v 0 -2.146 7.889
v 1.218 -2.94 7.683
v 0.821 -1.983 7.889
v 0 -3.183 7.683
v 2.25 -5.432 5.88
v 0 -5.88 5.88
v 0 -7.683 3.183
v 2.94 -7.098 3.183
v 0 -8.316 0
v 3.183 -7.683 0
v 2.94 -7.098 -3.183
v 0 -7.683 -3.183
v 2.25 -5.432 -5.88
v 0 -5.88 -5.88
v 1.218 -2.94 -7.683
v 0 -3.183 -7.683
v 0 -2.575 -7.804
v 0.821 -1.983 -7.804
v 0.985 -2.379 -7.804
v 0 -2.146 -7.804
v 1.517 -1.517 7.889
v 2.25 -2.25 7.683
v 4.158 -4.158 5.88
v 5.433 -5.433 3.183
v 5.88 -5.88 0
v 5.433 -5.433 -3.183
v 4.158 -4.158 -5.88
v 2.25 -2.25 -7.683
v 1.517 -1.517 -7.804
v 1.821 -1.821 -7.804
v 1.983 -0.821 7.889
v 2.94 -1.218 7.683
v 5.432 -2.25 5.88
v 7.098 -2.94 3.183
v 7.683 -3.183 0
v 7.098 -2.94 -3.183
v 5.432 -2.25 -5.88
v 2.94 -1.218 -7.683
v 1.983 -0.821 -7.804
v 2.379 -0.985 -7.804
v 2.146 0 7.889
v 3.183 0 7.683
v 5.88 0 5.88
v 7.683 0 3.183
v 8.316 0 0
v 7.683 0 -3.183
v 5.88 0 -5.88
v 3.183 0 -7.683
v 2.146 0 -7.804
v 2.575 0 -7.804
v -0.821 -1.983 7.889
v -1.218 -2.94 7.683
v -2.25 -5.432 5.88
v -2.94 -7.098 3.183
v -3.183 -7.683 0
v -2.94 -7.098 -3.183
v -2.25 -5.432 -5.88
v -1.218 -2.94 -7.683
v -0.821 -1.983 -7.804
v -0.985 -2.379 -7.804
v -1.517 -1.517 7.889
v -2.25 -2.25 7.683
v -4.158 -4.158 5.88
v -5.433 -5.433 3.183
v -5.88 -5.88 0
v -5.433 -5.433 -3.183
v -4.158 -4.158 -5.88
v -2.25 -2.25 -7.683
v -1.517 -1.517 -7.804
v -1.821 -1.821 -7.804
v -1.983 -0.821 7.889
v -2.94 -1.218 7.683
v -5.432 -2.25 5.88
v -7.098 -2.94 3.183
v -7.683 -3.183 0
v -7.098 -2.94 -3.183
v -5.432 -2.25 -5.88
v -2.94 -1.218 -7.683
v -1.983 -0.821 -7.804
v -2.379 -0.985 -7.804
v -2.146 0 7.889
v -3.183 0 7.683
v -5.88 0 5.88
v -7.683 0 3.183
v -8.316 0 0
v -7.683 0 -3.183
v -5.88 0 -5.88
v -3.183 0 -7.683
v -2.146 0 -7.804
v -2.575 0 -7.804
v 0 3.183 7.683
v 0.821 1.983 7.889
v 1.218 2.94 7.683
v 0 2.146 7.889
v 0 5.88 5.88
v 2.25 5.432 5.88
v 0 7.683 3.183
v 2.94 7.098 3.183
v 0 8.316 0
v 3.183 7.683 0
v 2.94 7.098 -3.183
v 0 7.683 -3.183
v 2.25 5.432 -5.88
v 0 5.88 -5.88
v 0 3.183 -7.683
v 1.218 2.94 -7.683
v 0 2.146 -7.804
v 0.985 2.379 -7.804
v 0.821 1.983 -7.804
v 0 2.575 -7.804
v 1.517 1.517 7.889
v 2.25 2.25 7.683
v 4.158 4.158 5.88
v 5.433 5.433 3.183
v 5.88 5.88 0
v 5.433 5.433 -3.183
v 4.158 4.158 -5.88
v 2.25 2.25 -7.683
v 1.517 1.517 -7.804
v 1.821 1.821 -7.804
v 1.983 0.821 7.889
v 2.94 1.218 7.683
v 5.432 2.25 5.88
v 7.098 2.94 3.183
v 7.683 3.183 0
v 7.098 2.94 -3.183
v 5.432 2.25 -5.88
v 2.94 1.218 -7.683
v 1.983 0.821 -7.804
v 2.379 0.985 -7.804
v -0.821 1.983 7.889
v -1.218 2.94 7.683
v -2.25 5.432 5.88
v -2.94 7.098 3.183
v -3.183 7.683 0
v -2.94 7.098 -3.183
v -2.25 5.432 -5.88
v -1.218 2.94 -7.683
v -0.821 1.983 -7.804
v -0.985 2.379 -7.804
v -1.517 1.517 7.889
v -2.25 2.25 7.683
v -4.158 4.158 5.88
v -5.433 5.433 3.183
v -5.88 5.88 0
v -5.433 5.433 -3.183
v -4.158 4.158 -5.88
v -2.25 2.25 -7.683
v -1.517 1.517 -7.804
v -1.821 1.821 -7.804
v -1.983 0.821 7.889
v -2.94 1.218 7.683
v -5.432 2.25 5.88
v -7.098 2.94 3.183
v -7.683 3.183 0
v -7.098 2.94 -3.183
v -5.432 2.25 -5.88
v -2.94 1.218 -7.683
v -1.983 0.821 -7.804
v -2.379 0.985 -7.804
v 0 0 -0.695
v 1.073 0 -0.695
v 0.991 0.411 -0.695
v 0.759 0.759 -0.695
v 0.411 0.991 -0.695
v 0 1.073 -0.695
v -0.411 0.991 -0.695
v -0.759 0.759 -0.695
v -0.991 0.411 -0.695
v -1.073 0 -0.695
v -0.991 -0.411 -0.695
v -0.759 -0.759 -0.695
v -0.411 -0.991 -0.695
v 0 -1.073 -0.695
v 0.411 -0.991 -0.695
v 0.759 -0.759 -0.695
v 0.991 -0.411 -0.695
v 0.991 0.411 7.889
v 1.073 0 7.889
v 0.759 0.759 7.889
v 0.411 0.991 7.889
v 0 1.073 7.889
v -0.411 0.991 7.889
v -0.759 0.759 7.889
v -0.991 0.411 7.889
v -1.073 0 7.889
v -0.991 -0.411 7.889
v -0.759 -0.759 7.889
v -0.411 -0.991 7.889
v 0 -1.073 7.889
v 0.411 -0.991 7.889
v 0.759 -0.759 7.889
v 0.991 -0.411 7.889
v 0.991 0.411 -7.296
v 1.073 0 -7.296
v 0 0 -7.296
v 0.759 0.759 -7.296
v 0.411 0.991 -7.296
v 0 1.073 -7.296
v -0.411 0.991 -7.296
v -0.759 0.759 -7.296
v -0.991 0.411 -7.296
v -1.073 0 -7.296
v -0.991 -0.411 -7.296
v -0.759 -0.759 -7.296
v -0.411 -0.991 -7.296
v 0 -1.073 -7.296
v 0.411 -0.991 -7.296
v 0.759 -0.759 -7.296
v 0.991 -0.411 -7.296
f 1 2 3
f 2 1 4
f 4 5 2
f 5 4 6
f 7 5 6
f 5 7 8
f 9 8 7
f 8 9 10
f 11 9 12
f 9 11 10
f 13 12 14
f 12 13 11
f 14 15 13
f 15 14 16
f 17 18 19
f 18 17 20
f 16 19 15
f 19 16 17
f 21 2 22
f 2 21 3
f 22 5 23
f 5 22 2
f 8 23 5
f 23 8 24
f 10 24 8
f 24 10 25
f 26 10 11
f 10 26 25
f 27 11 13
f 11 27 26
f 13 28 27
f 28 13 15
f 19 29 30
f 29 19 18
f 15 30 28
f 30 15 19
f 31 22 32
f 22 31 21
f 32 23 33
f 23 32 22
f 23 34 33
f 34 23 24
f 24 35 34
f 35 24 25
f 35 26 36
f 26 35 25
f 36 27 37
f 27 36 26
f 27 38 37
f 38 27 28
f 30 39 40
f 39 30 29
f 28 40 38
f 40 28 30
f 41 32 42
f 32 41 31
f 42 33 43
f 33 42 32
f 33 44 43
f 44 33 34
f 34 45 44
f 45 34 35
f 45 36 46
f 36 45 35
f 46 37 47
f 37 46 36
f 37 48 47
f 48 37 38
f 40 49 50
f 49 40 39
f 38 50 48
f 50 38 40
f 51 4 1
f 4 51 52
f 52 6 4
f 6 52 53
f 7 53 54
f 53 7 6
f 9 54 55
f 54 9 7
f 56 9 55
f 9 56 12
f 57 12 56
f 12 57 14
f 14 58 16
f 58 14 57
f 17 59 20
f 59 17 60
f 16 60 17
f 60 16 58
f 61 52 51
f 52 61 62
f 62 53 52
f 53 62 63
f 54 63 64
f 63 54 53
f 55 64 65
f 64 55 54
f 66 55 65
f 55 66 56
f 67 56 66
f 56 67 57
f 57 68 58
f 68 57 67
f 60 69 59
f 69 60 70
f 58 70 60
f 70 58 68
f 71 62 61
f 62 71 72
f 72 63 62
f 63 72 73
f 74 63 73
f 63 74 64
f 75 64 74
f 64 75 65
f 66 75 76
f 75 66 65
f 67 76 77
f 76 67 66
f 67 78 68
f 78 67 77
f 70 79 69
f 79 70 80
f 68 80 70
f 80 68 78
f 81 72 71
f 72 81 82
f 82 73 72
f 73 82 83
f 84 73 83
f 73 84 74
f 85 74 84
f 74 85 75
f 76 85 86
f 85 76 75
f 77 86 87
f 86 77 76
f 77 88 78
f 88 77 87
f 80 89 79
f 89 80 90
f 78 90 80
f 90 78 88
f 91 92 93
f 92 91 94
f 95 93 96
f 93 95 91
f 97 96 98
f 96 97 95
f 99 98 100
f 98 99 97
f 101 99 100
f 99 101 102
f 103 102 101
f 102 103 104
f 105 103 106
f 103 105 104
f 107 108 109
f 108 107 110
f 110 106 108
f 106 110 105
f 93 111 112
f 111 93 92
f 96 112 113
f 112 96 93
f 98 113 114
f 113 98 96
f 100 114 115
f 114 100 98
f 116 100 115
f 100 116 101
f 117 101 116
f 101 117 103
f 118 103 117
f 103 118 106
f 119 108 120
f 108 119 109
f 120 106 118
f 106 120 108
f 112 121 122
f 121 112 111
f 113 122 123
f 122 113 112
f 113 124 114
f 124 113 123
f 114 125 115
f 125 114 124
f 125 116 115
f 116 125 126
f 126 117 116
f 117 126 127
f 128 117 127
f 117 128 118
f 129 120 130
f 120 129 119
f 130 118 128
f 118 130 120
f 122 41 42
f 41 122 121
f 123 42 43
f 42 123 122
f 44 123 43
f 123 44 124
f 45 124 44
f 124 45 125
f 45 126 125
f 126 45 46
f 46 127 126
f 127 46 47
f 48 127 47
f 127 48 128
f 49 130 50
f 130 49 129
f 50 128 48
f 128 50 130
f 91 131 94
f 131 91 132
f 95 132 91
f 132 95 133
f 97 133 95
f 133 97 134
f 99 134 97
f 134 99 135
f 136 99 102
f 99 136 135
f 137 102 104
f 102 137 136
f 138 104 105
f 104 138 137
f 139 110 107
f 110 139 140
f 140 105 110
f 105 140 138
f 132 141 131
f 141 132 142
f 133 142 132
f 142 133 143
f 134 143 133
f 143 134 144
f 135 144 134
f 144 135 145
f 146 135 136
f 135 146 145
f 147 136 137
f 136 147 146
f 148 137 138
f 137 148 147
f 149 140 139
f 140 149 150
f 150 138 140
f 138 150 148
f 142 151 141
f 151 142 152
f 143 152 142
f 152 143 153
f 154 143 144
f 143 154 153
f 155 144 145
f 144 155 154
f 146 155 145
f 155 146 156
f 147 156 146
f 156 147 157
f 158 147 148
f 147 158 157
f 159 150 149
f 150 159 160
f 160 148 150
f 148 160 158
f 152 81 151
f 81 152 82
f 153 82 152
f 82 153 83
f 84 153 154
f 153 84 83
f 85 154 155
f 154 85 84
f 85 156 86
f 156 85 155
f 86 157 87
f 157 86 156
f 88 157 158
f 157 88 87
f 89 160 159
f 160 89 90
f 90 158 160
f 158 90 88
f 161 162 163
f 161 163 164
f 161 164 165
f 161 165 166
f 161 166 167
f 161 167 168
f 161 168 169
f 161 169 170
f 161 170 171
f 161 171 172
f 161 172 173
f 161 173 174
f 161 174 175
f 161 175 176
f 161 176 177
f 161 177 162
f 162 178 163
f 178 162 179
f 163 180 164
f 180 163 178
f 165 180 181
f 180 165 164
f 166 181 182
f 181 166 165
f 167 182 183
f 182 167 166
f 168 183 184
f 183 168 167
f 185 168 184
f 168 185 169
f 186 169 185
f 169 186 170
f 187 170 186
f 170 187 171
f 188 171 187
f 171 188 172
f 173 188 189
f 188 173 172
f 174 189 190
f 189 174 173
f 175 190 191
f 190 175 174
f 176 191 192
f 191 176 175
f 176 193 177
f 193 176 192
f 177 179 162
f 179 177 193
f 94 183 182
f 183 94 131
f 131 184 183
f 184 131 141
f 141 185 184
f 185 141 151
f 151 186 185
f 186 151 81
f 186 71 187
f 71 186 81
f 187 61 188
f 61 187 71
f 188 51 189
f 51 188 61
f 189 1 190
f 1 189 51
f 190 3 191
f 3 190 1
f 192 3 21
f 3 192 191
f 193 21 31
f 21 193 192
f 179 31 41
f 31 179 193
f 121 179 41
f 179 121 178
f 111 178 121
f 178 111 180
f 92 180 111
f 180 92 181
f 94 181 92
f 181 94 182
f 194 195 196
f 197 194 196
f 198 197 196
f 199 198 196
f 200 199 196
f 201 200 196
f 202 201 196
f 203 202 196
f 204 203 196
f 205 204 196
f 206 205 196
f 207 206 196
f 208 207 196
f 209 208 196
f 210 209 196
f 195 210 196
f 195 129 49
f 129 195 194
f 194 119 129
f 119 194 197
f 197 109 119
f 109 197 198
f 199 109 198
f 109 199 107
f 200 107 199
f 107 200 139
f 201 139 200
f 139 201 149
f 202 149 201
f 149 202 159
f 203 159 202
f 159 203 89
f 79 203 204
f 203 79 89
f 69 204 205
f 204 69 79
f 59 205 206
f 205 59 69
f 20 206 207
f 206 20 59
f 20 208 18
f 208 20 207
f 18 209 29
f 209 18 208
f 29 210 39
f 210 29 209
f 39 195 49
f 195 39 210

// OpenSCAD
// file: ../p/4-4ring1.scad
use <../lib.scad>
function ldraw_lib__4_4ring1() = [
// 0 Ring  1 x 1.0
// 0 Name: 4-4ring1.dat
// 0 Author: James Jessiman
// 0 !LDRAW_ORG Primitive UPDATE 2009-01
// 0 !LICENSE Licensed under CC BY 2.0 and CC BY 4.0 : see CAreadme.txt
// 
// 0 BFC CERTIFY CCW
  [0,"BFC","CERTIFY"],
  [0,"BFC","CCW"],
// 
// 0 !HISTORY 1998-12-15 [PTadmin] Official Update 1998-10
// 0 !HISTORY 2002-04-08 [BrickCaster] Modified for BFC compliance
// 0 !HISTORY 2002-04-25 [PTadmin] Official Update 2002-02
// 0 !HISTORY 2007-06-24 [PTadmin] Header formatted for Contributor Agreement
// 0 !HISTORY 2008-07-01 [PTadmin] Official Update 2008-01
// 0 !HISTORY 2008-08-26 [cwdee] Switch polygon winding and rename
// 0 !HISTORY 2009-05-02 [PTadmin] Official Update 2009-01
// 
// 
// 4 16 -0.7654 0 1.8478 -0.3827 0 0.9239 0 0 1 0 0 2
  [4,16,-0.7654,0,1.8478,-0.3827,0,0.9239,0,0,1,0,0,2],
// 4 16 -1.4142 0 1.4142 -0.7071 0 0.7071 -0.3827 0 0.9239 -0.7654 0 1.8478
  [4,16,-1.4142,0,1.4142,-0.7071,0,0.7071,-0.3827,0,0.9239,-0.7654,0,1.8478],
// 4 16 -1.8478 0 0.7654 -0.9239 0 0.3827 -0.7071 0 0.7071 -1.4142 0 1.41420
  [4,16,-1.8478,0,0.7654,-0.9239,0,0.3827,-0.7071,0,0.7071,-1.4142,0,1.41420],
// 4 16 -2 0 0 -1 0 0 -0.9239 0 0.3827 -1.8478 0 0.7654
  [4,16,-2,0,0,-1,0,0,-0.9239,0,0.3827,-1.8478,0,0.7654],
// 4 16 -1.8478 0 -0.7654 -0.9239 0 -0.3827 -1 0 0 -2 0 0
  [4,16,-1.8478,0,-0.7654,-0.9239,0,-0.3827,-1,0,0,-2,0,0],
// 4 16 -1.4142 0 -1.4142 -0.7071 0 -0.7071 -0.9239 0 -0.3827 -1.8478 0 -0.7654
  [4,16,-1.4142,0,-1.4142,-0.7071,0,-0.7071,-0.9239,0,-0.3827,-1.8478,0,-0.7654],
// 4 16 -0.7654 0 -1.8478 -0.3827 0 -0.9239 -0.7071 0 -0.7071 -1.4142 0 -1.4142
  [4,16,-0.7654,0,-1.8478,-0.3827,0,-0.9239,-0.7071,0,-0.7071,-1.4142,0,-1.4142],
// 4 16 0 0 -2 0 0 -1 -0.3827 0 -0.9239 -0.7654 0 -1.8478
  [4,16,0,0,-2,0,0,-1,-0.3827,0,-0.9239,-0.7654,0,-1.8478],
// 4 16 0.7654 0 -1.8478 0.3827 0 -0.9239 0 0 -1 0 0 -2
  [4,16,0.7654,0,-1.8478,0.3827,0,-0.9239,0,0,-1,0,0,-2],
// 4 16 1.4142 0 -1.4142 0.7071 0 -0.7071 0.3827 0 -0.9239 0.7654 0 -1.8478
  [4,16,1.4142,0,-1.4142,0.7071,0,-0.7071,0.3827,0,-0.9239,0.7654,0,-1.8478],
// 4 16 1.8478 0 -0.7654 0.9239 0 -0.3827 0.7071 0 -0.7071 1.4142 0 -1.4142
  [4,16,1.8478,0,-0.7654,0.9239,0,-0.3827,0.7071,0,-0.7071,1.4142,0,-1.4142],
// 4 16 2 0 0 1 0 0 0.9239 0 -0.3827 1.8478 0 -0.7654
  [4,16,2,0,0,1,0,0,0.9239,0,-0.3827,1.8478,0,-0.7654],
// 4 16 1.8478 0 0.7654 0.9239 0 0.3827 1 0 0 2 0 0
  [4,16,1.8478,0,0.7654,0.9239,0,0.3827,1,0,0,2,0,0],
// 4 16 1.4142 0 1.4142 0.7071 0 0.7071 0.9239 0 0.3827 1.8478 0 0.7654
  [4,16,1.4142,0,1.4142,0.7071,0,0.7071,0.9239,0,0.3827,1.8478,0,0.7654],
// 4 16 0.7654 0 1.8478 0.3827 0 0.9239 0.7071 0 0.7071 1.4142 0 1.4142
  [4,16,0.7654,0,1.8478,0.3827,0,0.9239,0.7071,0,0.7071,1.4142,0,1.4142],
// 4 16 0 0 2 0 0 1 0.3827 0 0.9239 0.7654 0 1.8478
  [4,16,0,0,2,0,0,1,0.3827,0,0.9239,0.7654,0,1.8478],
// 0
];
module ldraw_lib__4_4ring1(step=0, col=false, unit=2/5, alt=false, line=0.2, solid=!$preview)
    makepoly(ldraw_lib__4_4ring1(), step=step, col=col, unit=unit, alt=alt, line=line, solid=solid);
ldraw_lib__4_4ring1(line=0.2);
// file: ../p/4-4edge.scad
use <../lib.scad>
function ldraw_lib__4_4edge() = [
// 0 Circle 1.0
// 0 Name: 4-4edge.dat
// 0 Author: James Jessiman
// 0 !LDRAW_ORG Primitive UPDATE 2017-01
// 0 !LICENSE Licensed under CC BY 4.0 : see CAreadme.txt
// 
// 0 BFC CERTIFY CCW
  [0,"BFC","CERTIFY"],
  [0,"BFC","CCW"],
// 
// 0 !HISTORY 1998-12-15 [PTadmin] Official Update 1998-10
// 0 !HISTORY 2005-12-28 [PTadmin] Official Update 2005-01
// 0 !HISTORY 2007-06-24 [PTadmin] Header formatted for Contributor Agreement
// 0 !HISTORY 2008-07-01 [PTadmin] Official Update 2008-01
// 0 !HISTORY 2017-01-15 [Steffen] BFCed
// 0 !HISTORY 2017-12-30 [PTadmin] Official Update 2017-01
// 
// 
// 2 24 1 0 0 0.9239 0 0.3827
  [2,24,1,0,0,0.9239,0,0.3827],
// 2 24 0.9239 0 0.3827 0.7071 0 0.7071
  [2,24,0.9239,0,0.3827,0.7071,0,0.7071],
// 2 24 0.7071 0 0.7071 0.3827 0 0.9239
  [2,24,0.7071,0,0.7071,0.3827,0,0.9239],
// 2 24 0.3827 0 0.9239 0 0 1
  [2,24,0.3827,0,0.9239,0,0,1],
// 2 24 0 0 1 -0.3827 0 0.9239
  [2,24,0,0,1,-0.3827,0,0.9239],
// 2 24 -0.3827 0 0.9239 -0.7071 0 0.7071
  [2,24,-0.3827,0,0.9239,-0.7071,0,0.7071],
// 2 24 -0.7071 0 0.7071 -0.9239 0 0.3827
  [2,24,-0.7071,0,0.7071,-0.9239,0,0.3827],
// 2 24 -0.9239 0 0.3827 -1 0 -0
  [2,24,-0.9239,0,0.3827,-1,0,-0],
// 2 24 -1 0 -0 -0.9239 0 -0.3827
  [2,24,-1,0,-0,-0.9239,0,-0.3827],
// 2 24 -0.9239 0 -0.3827 -0.7071 0 -0.7071
  [2,24,-0.9239,0,-0.3827,-0.7071,0,-0.7071],
// 2 24 -0.7071 0 -0.7071 -0.3827 0 -0.9239
  [2,24,-0.7071,0,-0.7071,-0.3827,0,-0.9239],
// 2 24 -0.3827 0 -0.9239 0 0 -1
  [2,24,-0.3827,0,-0.9239,0,0,-1],
// 2 24 0 0 -1 0.3827 0 -0.9239
  [2,24,0,0,-1,0.3827,0,-0.9239],
// 2 24 0.3827 0 -0.9239 0.7071 0 -0.7071
  [2,24,0.3827,0,-0.9239,0.7071,0,-0.7071],
// 2 24 0.7071 0 -0.7071 0.9239 0 -0.3827
  [2,24,0.7071,0,-0.7071,0.9239,0,-0.3827],
// 2 24 0.9239 0 -0.3827 1 0 0
  [2,24,0.9239,0,-0.3827,1,0,0],
];
module ldraw_lib__4_4edge(step=0, col=false, unit=2/5, alt=false, line=0.2, solid=!$preview)
    makepoly(ldraw_lib__4_4edge(), step=step, col=col, unit=unit, alt=alt, line=line, solid=solid);
ldraw_lib__4_4edge(line=0.2);
// file: ../p/4-4disc.scad
use <../lib.scad>
function ldraw_lib__4_4disc() = [
// 0 Disc 1.0
// 0 Name: 4-4disc.dat
// 0 Author: James Jessiman
// 0 !LDRAW_ORG Primitive UPDATE 2002-02
// 0 !LICENSE Licensed under CC BY 4.0 : see CAreadme.txt
// 
// 0 BFC CERTIFY CCW
  [0,"BFC","CERTIFY"],
  [0,"BFC","CCW"],
// 
// 0 !HISTORY 1998-12-15 [PTadmin] Official Update 1998-10
// 0 !HISTORY 2002-03-23 [sbliss] Added BFC statement
// 0 !HISTORY 2002-04-25 [PTadmin] Official Update 2002-02
// 0 !HISTORY 2007-06-24 [PTadmin] Header formatted for Contributor Agreement
// 0 !HISTORY 2008-07-01 [PTadmin] Official Update 2008-01
// 
// 
// 3 16 0 0 0 1 0 0 0.9239 0 0.3827
  [3,16,0,0,0,1,0,0,0.9239,0,0.3827],
// 3 16 0 0 0 0.9239 0 0.3827 0.7071 0 0.7071
  [3,16,0,0,0,0.9239,0,0.3827,0.7071,0,0.7071],
// 3 16 0 0 0 0.7071 0 0.7071 0.3827 0 0.9239
  [3,16,0,0,0,0.7071,0,0.7071,0.3827,0,0.9239],
// 3 16 0 0 0 0.3827 0 0.9239 0 0 1
  [3,16,0,0,0,0.3827,0,0.9239,0,0,1],
// 3 16 0 0 0 0 0 1 -0.3827 0 0.9239
  [3,16,0,0,0,0,0,1,-0.3827,0,0.9239],
// 3 16 0 0 0 -0.3827 0 0.9239 -0.7071 0 0.7071
  [3,16,0,0,0,-0.3827,0,0.9239,-0.7071,0,0.7071],
// 3 16 0 0 0 -0.7071 0 0.7071 -0.9239 0 0.3827
  [3,16,0,0,0,-0.7071,0,0.7071,-0.9239,0,0.3827],
// 3 16 0 0 0 -0.9239 0 0.3827 -1 0 -0
  [3,16,0,0,0,-0.9239,0,0.3827,-1,0,-0],
// 3 16 0 0 0 -1 0 -0 -0.9239 0 -0.3827
  [3,16,0,0,0,-1,0,-0,-0.9239,0,-0.3827],
// 3 16 0 0 0 -0.9239 0 -0.3827 -0.7071 0 -0.7071
  [3,16,0,0,0,-0.9239,0,-0.3827,-0.7071,0,-0.7071],
// 3 16 0 0 0 -0.7071 0 -0.7071 -0.3827 0 -0.9239
  [3,16,0,0,0,-0.7071,0,-0.7071,-0.3827,0,-0.9239],
// 3 16 0 0 0 -0.3827 0 -0.9239 0 0 -1
  [3,16,0,0,0,-0.3827,0,-0.9239,0,0,-1],
// 3 16 0 0 0 0 0 -1 0.3827 0 -0.9239
  [3,16,0,0,0,0,0,-1,0.3827,0,-0.9239],
// 3 16 0 0 0 0.3827 0 -0.9239 0.7071 0 -0.7071
  [3,16,0,0,0,0.3827,0,-0.9239,0.7071,0,-0.7071],
// 3 16 0 0 0 0.7071 0 -0.7071 0.9239 0 -0.3827
  [3,16,0,0,0,0.7071,0,-0.7071,0.9239,0,-0.3827],
// 3 16 0 0 0 0.9239 0 -0.3827 1 0 0
  [3,16,0,0,0,0.9239,0,-0.3827,1,0,0],
// 0
];
module ldraw_lib__4_4disc(step=0, col=false, unit=2/5, alt=false, line=0.2, solid=!$preview)
    makepoly(ldraw_lib__4_4disc(), step=step, col=col, unit=unit, alt=alt, line=line, solid=solid);
ldraw_lib__4_4disc(line=0.2);
// file: ../p/4-4cyli.scad
use <../lib.scad>
function ldraw_lib__4_4cyli() = [
// 0 Cylinder 1.0
// 0 Name: 4-4cyli.dat
// 0 Author: James Jessiman
// 0 !LDRAW_ORG Primitive UPDATE 2005-01
// 0 !LICENSE Licensed under CC BY 2.0 and CC BY 4.0 : see CAreadme.txt
// 
// 0 BFC CERTIFY CCW
  [0,"BFC","CERTIFY"],
  [0,"BFC","CCW"],
// 
// 0 !HISTORY 1998-12-15 [PTadmin] Official Update 1998-10
// 0 !HISTORY 2002-03-23 [sbliss] Added BFC statement; merged headers from files in distributions LDraw 0.27 and Complete.
// 0 !HISTORY 2002-04-25 [PTadmin] Official Update 2002-02
// 0 !HISTORY 2004-12-14 [guyvivan] BFC CCW
// 0 !HISTORY 2005-12-28 [PTadmin] Official Update 2005-01
// 0 !HISTORY 2007-06-24 [PTadmin] Header formatted for Contributor Agreement
// 0 !HISTORY 2008-07-01 [PTadmin] Official Update 2008-01
// 
// 
// 4 16 1 1 0 0.9239 1 0.3827 0.9239 0 0.3827 1 0 0
  [4,16,1,1,0,0.9239,1,0.3827,0.9239,0,0.3827,1,0,0],
// 5 24 1 0 0 1 1 0 0.9239 0 0.3827 0.9239 0 -0.3827
  [5,24,1,0,0,1,1,0,0.9239,0,0.3827,0.9239,0,-0.3827],
// 4 16 0.9239 1 0.3827 0.7071 1 0.7071 0.7071 0 0.7071 0.9239 0 0.3827
  [4,16,0.9239,1,0.3827,0.7071,1,0.7071,0.7071,0,0.7071,0.9239,0,0.3827],
// 5 24 0.9239 0 0.3827 0.9239 1 0.3827 0.7071 0 0.7071 1 0 0
  [5,24,0.9239,0,0.3827,0.9239,1,0.3827,0.7071,0,0.7071,1,0,0],
// 4 16 0.7071 1 0.7071 0.3827 1 0.9239 0.3827 0 0.9239 0.7071 0 0.7071
  [4,16,0.7071,1,0.7071,0.3827,1,0.9239,0.3827,0,0.9239,0.7071,0,0.7071],
// 5 24 0.7071 0 0.7071 0.7071 1 0.7071 0.3827 0 0.9239 0.9239 0 0.3827
  [5,24,0.7071,0,0.7071,0.7071,1,0.7071,0.3827,0,0.9239,0.9239,0,0.3827],
// 4 16 0.3827 1 0.9239 0 1 1 0 0 1 0.3827 0 0.9239
  [4,16,0.3827,1,0.9239,0,1,1,0,0,1,0.3827,0,0.9239],
// 5 24 0.3827 0 0.9239 0.3827 1 0.9239 0 0 1 0.7071 0 0.7071
  [5,24,0.3827,0,0.9239,0.3827,1,0.9239,0,0,1,0.7071,0,0.7071],
// 4 16 0 1 1 -0.3827 1 0.9239 -0.3827 0 0.9239 0 0 1
  [4,16,0,1,1,-0.3827,1,0.9239,-0.3827,0,0.9239,0,0,1],
// 5 24 0 0 1 0 1 1 -0.3827 0 0.9239 0.3827 0 0.9239
  [5,24,0,0,1,0,1,1,-0.3827,0,0.9239,0.3827,0,0.9239],
// 4 16 -0.3827 1 0.9239 -0.7071 1 0.7071 -0.7071 0 0.7071 -0.3827 0 0.9239
  [4,16,-0.3827,1,0.9239,-0.7071,1,0.7071,-0.7071,0,0.7071,-0.3827,0,0.9239],
// 5 24 -0.3827 0 0.9239 -0.3827 1 0.9239 -0.7071 0 0.7071 0 0 1
  [5,24,-0.3827,0,0.9239,-0.3827,1,0.9239,-0.7071,0,0.7071,0,0,1],
// 4 16 -0.7071 1 0.7071 -0.9239 1 0.3827 -0.9239 0 0.3827 -0.7071 0 0.7071
  [4,16,-0.7071,1,0.7071,-0.9239,1,0.3827,-0.9239,0,0.3827,-0.7071,0,0.7071],
// 5 24 -0.7071 0 0.7071 -0.7071 1 0.7071 -0.9239 0 0.3827 -0.3827 0 0.9239
  [5,24,-0.7071,0,0.7071,-0.7071,1,0.7071,-0.9239,0,0.3827,-0.3827,0,0.9239],
// 4 16 -0.9239 1 0.3827 -1 1 0 -1 0 0 -0.9239 0 0.3827
  [4,16,-0.9239,1,0.3827,-1,1,0,-1,0,0,-0.9239,0,0.3827],
// 5 24 -0.9239 0 0.3827 -0.9239 1 0.3827 -1 0 0 -0.7071 0 0.7071
  [5,24,-0.9239,0,0.3827,-0.9239,1,0.3827,-1,0,0,-0.7071,0,0.7071],
// 4 16 -1 1 0 -0.9239 1 -0.3827 -0.9239 0 -0.3827 -1 0 0
  [4,16,-1,1,0,-0.9239,1,-0.3827,-0.9239,0,-0.3827,-1,0,0],
// 5 24 -1 0 0 -1 1 0 -0.9239 0 -0.3827 -0.9239 0 0.3827
  [5,24,-1,0,0,-1,1,0,-0.9239,0,-0.3827,-0.9239,0,0.3827],
// 4 16 -0.9239 1 -0.3827 -0.7071 1 -0.7071 -0.7071 0 -0.7071 -0.9239 0 -0.3827
  [4,16,-0.9239,1,-0.3827,-0.7071,1,-0.7071,-0.7071,0,-0.7071,-0.9239,0,-0.3827],
// 5 24 -0.9239 0 -0.3827 -0.9239 1 -0.3827 -0.7071 0 -0.7071 -1 0 0
  [5,24,-0.9239,0,-0.3827,-0.9239,1,-0.3827,-0.7071,0,-0.7071,-1,0,0],
// 4 16 -0.7071 1 -0.7071 -0.3827 1 -0.9239 -0.3827 0 -0.9239 -0.7071 0 -0.7071
  [4,16,-0.7071,1,-0.7071,-0.3827,1,-0.9239,-0.3827,0,-0.9239,-0.7071,0,-0.7071],
// 5 24 -0.7071 0 -0.7071 -0.7071 1 -0.7071 -0.3827 0 -0.9239 -0.9239 0 -0.3827
  [5,24,-0.7071,0,-0.7071,-0.7071,1,-0.7071,-0.3827,0,-0.9239,-0.9239,0,-0.3827],
// 4 16 -0.3827 1 -0.9239 0 1 -1 0 0 -1 -0.3827 0 -0.9239
  [4,16,-0.3827,1,-0.9239,0,1,-1,0,0,-1,-0.3827,0,-0.9239],
// 5 24 -0.3827 0 -0.9239 -0.3827 1 -0.9239 0 0 -1 -0.7071 0 -0.7071
  [5,24,-0.3827,0,-0.9239,-0.3827,1,-0.9239,0,0,-1,-0.7071,0,-0.7071],
// 4 16 0 1 -1 0.3827 1 -0.9239 0.3827 0 -0.9239 0 0 -1
  [4,16,0,1,-1,0.3827,1,-0.9239,0.3827,0,-0.9239,0,0,-1],
// 5 24 0 0 -1 0 1 -1 0.3827 0 -0.9239 -0.3827 0 -0.9239
  [5,24,0,0,-1,0,1,-1,0.3827,0,-0.9239,-0.3827,0,-0.9239],
// 4 16 0.3827 1 -0.9239 0.7071 1 -0.7071 0.7071 0 -0.7071 0.3827 0 -0.9239
  [4,16,0.3827,1,-0.9239,0.7071,1,-0.7071,0.7071,0,-0.7071,0.3827,0,-0.9239],
// 5 24 0.3827 0 -0.9239 0.3827 1 -0.9239 0.7071 0 -0.7071 0 0 -1
  [5,24,0.3827,0,-0.9239,0.3827,1,-0.9239,0.7071,0,-0.7071,0,0,-1],
// 4 16 0.7071 1 -0.7071 0.9239 1 -0.3827 0.9239 0 -0.3827 0.7071 0 -0.7071
  [4,16,0.7071,1,-0.7071,0.9239,1,-0.3827,0.9239,0,-0.3827,0.7071,0,-0.7071],
// 5 24 0.7071 0 -0.7071 0.7071 1 -0.7071 0.9239 0 -0.3827 0.3827 0 -0.9239
  [5,24,0.7071,0,-0.7071,0.7071,1,-0.7071,0.9239,0,-0.3827,0.3827,0,-0.9239],
// 4 16 0.9239 1 -0.3827 1 1 0 1 0 0 0.9239 0 -0.3827
  [4,16,0.9239,1,-0.3827,1,1,0,1,0,0,0.9239,0,-0.3827],
// 5 24 0.9239 0 -0.3827 0.9239 1 -0.3827 1 0 0 0.7071 0 -0.7071
  [5,24,0.9239,0,-0.3827,0.9239,1,-0.3827,1,0,0,0.7071,0,-0.7071],
// 0
];
module ldraw_lib__4_4cyli(step=0, col=false, unit=2/5, alt=false, line=0.2, solid=!$preview)
    makepoly(ldraw_lib__4_4cyli(), step=step, col=col, unit=unit, alt=alt, line=line, solid=solid);
ldraw_lib__4_4cyli(line=0.2);
// file: ../p/4-4con1.scad
use <../lib.scad>
function ldraw_lib__4_4con1() = [
// 0 Cone  1 x 1.0
// 0 Name: 4-4con1.dat
// 0 Author: Steve Bliss [sbliss]
// 0 !LDRAW_ORG Primitive UPDATE 2012-01
// 0 !LICENSE Licensed under CC BY 4.0 : see CAreadme.txt
// 
// 0 BFC CERTIFY CCW
  [0,"BFC","CERTIFY"],
  [0,"BFC","CCW"],
// 
// 0 !HISTORY 1999-08-19 [sbliss] Renamed 4-4con12.dat to 4-4con1.dat, Moved all conditional lines before quads
// 0 !HISTORY 2000-05-07 [PTadmin] Official Update 2000-01
// 0 !HISTORY 2002-12-11 [cwdee] Standardised title and made BFC compliant
// 0 !HISTORY 2003-08-01 [PTadmin] Official Update 2003-02
// 0 !HISTORY 2007-06-24 [PTadmin] Header formatted for Contributor Agreement
// 0 !HISTORY 2008-07-01 [PTadmin] Official Update 2008-01
// 0 !HISTORY 2012-02-16 [Philo] Changed to CCW, reordered
// 0 !HISTORY 2012-03-30 [PTadmin] Official Update 2012-01
// 
// 
// 5 24 1 1 0 2 0 0 0.9239 1 -0.3827 0.9239 1 0.3827
  [5,24,1,1,0,2,0,0,0.9239,1,-0.3827,0.9239,1,0.3827],
// 5 24 0.9239 1 0.3827 1.8478 0 0.7654 1 1 0 0.7071 1 0.7071
  [5,24,0.9239,1,0.3827,1.8478,0,0.7654,1,1,0,0.7071,1,0.7071],
// 5 24 0.7071 1 0.7071 1.4142 0 1.4142 0.9239 1 0.3827 0.3827 1 0.9239
  [5,24,0.7071,1,0.7071,1.4142,0,1.4142,0.9239,1,0.3827,0.3827,1,0.9239],
// 5 24 0.3827 1 0.9239 0.7654 0 1.8478 0.7071 1 0.7071 0 1 1
  [5,24,0.3827,1,0.9239,0.7654,0,1.8478,0.7071,1,0.7071,0,1,1],
// 5 24 0 1 1 0 0 2 0.3827 1 0.9239 -0.3827 1 0.9239
  [5,24,0,1,1,0,0,2,0.3827,1,0.9239,-0.3827,1,0.9239],
// 5 24 -0.3827 1 0.9239 -0.7654 0 1.8478 0 1 1 -0.7071 1 0.7071
  [5,24,-0.3827,1,0.9239,-0.7654,0,1.8478,0,1,1,-0.7071,1,0.7071],
// 5 24 -0.7071 1 0.7071 -1.4142 0 1.4142 -0.3827 1 0.9239 -0.9239 1 0.3827
  [5,24,-0.7071,1,0.7071,-1.4142,0,1.4142,-0.3827,1,0.9239,-0.9239,1,0.3827],
// 5 24 -0.9239 1 0.3827 -1.8478 0 0.7654 -0.7071 1 0.7071 -1 1 0
  [5,24,-0.9239,1,0.3827,-1.8478,0,0.7654,-0.7071,1,0.7071,-1,1,0],
// 5 24 -1 1 0 -2 0 0 -0.9239 1 0.3827 -0.9239 1 -0.3827
  [5,24,-1,1,0,-2,0,0,-0.9239,1,0.3827,-0.9239,1,-0.3827],
// 5 24 -0.9239 1 -0.3827 -1.8478 0 -0.7654 -1 1 0 -0.7071 1 -0.7071
  [5,24,-0.9239,1,-0.3827,-1.8478,0,-0.7654,-1,1,0,-0.7071,1,-0.7071],
// 5 24 -0.7071 1 -0.7071 -1.4142 0 -1.4142 -0.9239 1 -0.3827 -0.3827 1 -0.9239
  [5,24,-0.7071,1,-0.7071,-1.4142,0,-1.4142,-0.9239,1,-0.3827,-0.3827,1,-0.9239],
// 5 24 -0.3827 1 -0.9239 -0.7654 0 -1.8478 -0.7071 1 -0.7071 0 1 -1
  [5,24,-0.3827,1,-0.9239,-0.7654,0,-1.8478,-0.7071,1,-0.7071,0,1,-1],
// 5 24 0 1 -1 0 0 -2 -0.3827 1 -0.9239 0.3827 1 -0.9239
  [5,24,0,1,-1,0,0,-2,-0.3827,1,-0.9239,0.3827,1,-0.9239],
// 5 24 0.3827 1 -0.9239 0.7654 0 -1.8478 0 1 -1 0.7071 1 -0.7071
  [5,24,0.3827,1,-0.9239,0.7654,0,-1.8478,0,1,-1,0.7071,1,-0.7071],
// 5 24 0.7071 1 -0.7071 1.4142 0 -1.4142 0.3827 1 -0.9239 0.9239 1 -0.3827
  [5,24,0.7071,1,-0.7071,1.4142,0,-1.4142,0.3827,1,-0.9239,0.9239,1,-0.3827],
// 5 24 0.9239 1 -0.3827 1.8478 0 -0.7654 0.7071 1 -0.7071 1 1 0
  [5,24,0.9239,1,-0.3827,1.8478,0,-0.7654,0.7071,1,-0.7071,1,1,0],
// 
// 4 16 2 0 0 1 1 0 0.9239 1 0.3827 1.8478 0 0.7654
  [4,16,2,0,0,1,1,0,0.9239,1,0.3827,1.8478,0,0.7654],
// 4 16 1.8478 0 0.7654 0.9239 1 0.3827 0.7071 1 0.7071 1.4142 0 1.4142
  [4,16,1.8478,0,0.7654,0.9239,1,0.3827,0.7071,1,0.7071,1.4142,0,1.4142],
// 4 16 1.4142 0 1.4142 0.7071 1 0.7071 0.3827 1 0.9239 0.7654 0 1.8478
  [4,16,1.4142,0,1.4142,0.7071,1,0.7071,0.3827,1,0.9239,0.7654,0,1.8478],
// 4 16 0.7654 0 1.8478 0.3827 1 0.9239 0 1 1 0 0 2
  [4,16,0.7654,0,1.8478,0.3827,1,0.9239,0,1,1,0,0,2],
// 4 16 0 0 2 0 1 1 -0.3827 1 0.9239 -0.7654 0 1.8478
  [4,16,0,0,2,0,1,1,-0.3827,1,0.9239,-0.7654,0,1.8478],
// 4 16 -0.7654 0 1.8478 -0.3827 1 0.9239 -0.7071 1 0.7071 -1.4142 0 1.4142
  [4,16,-0.7654,0,1.8478,-0.3827,1,0.9239,-0.7071,1,0.7071,-1.4142,0,1.4142],
// 4 16 -1.4142 0 1.4142 -0.7071 1 0.7071 -0.9239 1 0.3827 -1.8478 0 0.7654
  [4,16,-1.4142,0,1.4142,-0.7071,1,0.7071,-0.9239,1,0.3827,-1.8478,0,0.7654],
// 4 16 -1.8478 0 0.7654 -0.9239 1 0.3827 -1 1 0 -2 0 0
  [4,16,-1.8478,0,0.7654,-0.9239,1,0.3827,-1,1,0,-2,0,0],
// 4 16 -2 0 0 -1 1 0 -0.9239 1 -0.3827 -1.8478 0 -0.7654
  [4,16,-2,0,0,-1,1,0,-0.9239,1,-0.3827,-1.8478,0,-0.7654],
// 4 16 -1.8478 0 -0.7654 -0.9239 1 -0.3827 -0.7071 1 -0.7071 -1.4142 0 -1.4142
  [4,16,-1.8478,0,-0.7654,-0.9239,1,-0.3827,-0.7071,1,-0.7071,-1.4142,0,-1.4142],
// 4 16 -1.4142 0 -1.4142 -0.7071 1 -0.7071 -0.3827 1 -0.9239 -0.7654 0 -1.8478
  [4,16,-1.4142,0,-1.4142,-0.7071,1,-0.7071,-0.3827,1,-0.9239,-0.7654,0,-1.8478],
// 4 16 -0.7654 0 -1.8478 -0.3827 1 -0.9239 0 1 -1 0 0 -2
  [4,16,-0.7654,0,-1.8478,-0.3827,1,-0.9239,0,1,-1,0,0,-2],
// 4 16 0 0 -2 0 1 -1 0.3827 1 -0.9239 0.7654 0 -1.8478
  [4,16,0,0,-2,0,1,-1,0.3827,1,-0.9239,0.7654,0,-1.8478],
// 4 16 0.7654 0 -1.8478 0.3827 1 -0.9239 0.7071 1 -0.7071 1.4142 0 -1.4142
  [4,16,0.7654,0,-1.8478,0.3827,1,-0.9239,0.7071,1,-0.7071,1.4142,0,-1.4142],
// 4 16 1.4142 0 -1.4142 0.7071 1 -0.7071 0.9239 1 -0.3827 1.8478 0 -0.7654
  [4,16,1.4142,0,-1.4142,0.7071,1,-0.7071,0.9239,1,-0.3827,1.8478,0,-0.7654],
// 4 16 1.8478 0 -0.7654 0.9239 1 -0.3827 1 1 0 2 0 0
  [4,16,1.8478,0,-0.7654,0.9239,1,-0.3827,1,1,0,2,0,0],
];
module ldraw_lib__4_4con1(step=0, col=false, unit=2/5, alt=false, line=0.2, solid=!$preview)
    makepoly(ldraw_lib__4_4con1(), step=step, col=col, unit=unit, alt=alt, line=line, solid=solid);
ldraw_lib__4_4con1(line=0.2);
// main file
use <../lib.scad>
use <../p/4-4con1.scad>
use <../p/4-4cyli.scad>
use <../p/4-4disc.scad>
use <../p/4-4edge.scad>
use <../p/4-4ring1.scad>
use <s/54821s01.scad>
function ldraw_lib__54821() = [
// 0 Technic Bionicle Ball 16.5 mm
// 0 Name: 54821.dat
// 0 Author: Philippe Hurbain [Philo]
// 0 !LDRAW_ORG Part UPDATE 2012-01
// 0 !LICENSE Licensed under CC BY 4.0 : see CAreadme.txt
// 
// 0 BFC CERTIFY CCW
  [0,"BFC","CERTIFY"],
  [0,"BFC","CCW"],
// 
// 0 !KEYWORDS Sphere, Zamor
// 
// 0 !HISTORY 2012-03-30 [PTadmin] Official Update 2012-01
// 
// 
// 1 16 0 0 0 1.073 0 0 0 1.073 0 0 0 1.073 s\54821s01.dat
  [1,16,0,0,0,1.073,0,0,0,1.073,0,0,0,1.073, ldraw_lib__s__54821s01()],
// 1 16 0 0 0 -1.073 0 0 0 1.073 0 0 0 1.073 s\54821s01.dat
  [1,16,0,0,0,-1.073,0,0,0,1.073,0,0,0,1.073, ldraw_lib__s__54821s01()],
// 1 16 0 0 0 1.073 0 0 0 1.073 0 0 0 -1.073 s\54821s01.dat
  [1,16,0,0,0,1.073,0,0,0,1.073,0,0,0,-1.073, ldraw_lib__s__54821s01()],
// 1 16 0 0 0 -1.073 0 0 0 1.073 0 0 0 -1.073 s\54821s01.dat
  [1,16,0,0,0,-1.073,0,0,0,1.073,0,0,0,-1.073, ldraw_lib__s__54821s01()],
// 1 16 0 -19.723 0 5.365 0 0 0 1.073 0 0 0 5.365 4-4edge.dat
  [1,16,0,-19.723,0,5.365,0,0,0,1.073,0,0,0,5.365, ldraw_lib__4_4edge()],
// 1 16 0 -19.723 0 2.6825 0 0 0 1.073 0 0 0 2.6825 4-4edge.dat
  [1,16,0,-19.723,0,2.6825,0,0,0,1.073,0,0,0,2.6825, ldraw_lib__4_4edge()],
// 1 16 0 1.737 0 2.6825 0 0 0 1.073 0 0 0 2.6825 4-4disc.dat
  [1,16,0,1.737,0,2.6825,0,0,0,1.073,0,0,0,2.6825, ldraw_lib__4_4disc()],
// 0 BFC INVERTNEXT
  [0,"BFC","INVERTNEXT"],
// 1 16 0 -19.723 0 2.6825 0 0 0 21.46 0 0 0 2.6825 4-4cyli.dat
  [1,16,0,-19.723,0,2.6825,0,0,0,21.46,0,0,0,2.6825, ldraw_lib__4_4cyli()],
// 1 16 0 -19.723 0 2.6825 0 0 0 1.073 0 0 0 2.6825 4-4ring1.dat
  [1,16,0,-19.723,0,2.6825,0,0,0,1.073,0,0,0,2.6825, ldraw_lib__4_4ring1()],
// 1 16 0 19.509 0 5.365 0 0 0 -1.073 0 0 0 5.365 4-4edge.dat
  [1,16,0,19.509,0,5.365,0,0,0,-1.073,0,0,0,5.365, ldraw_lib__4_4edge()],
// 1 16 0 18.241 0 2.6825 0 0 0 1.073 0 0 0 2.6825 4-4edge.dat
  [1,16,0,18.241,0,2.6825,0,0,0,1.073,0,0,0,2.6825, ldraw_lib__4_4edge()],
// 1 16 0 18.241 0 2.6825 0 0 0 -1.073 0 0 0 2.6825 4-4disc.dat
  [1,16,0,18.241,0,2.6825,0,0,0,-1.073,0,0,0,2.6825, ldraw_lib__4_4disc()],
// 0 BFC INVERTNEXT
  [0,"BFC","INVERTNEXT"],
// 1 16 0 19.509 0 2.6825 0 0 0 -1.26818 0 0 0 2.6825 4-4con1.dat
  [1,16,0,19.509,0,2.6825,0,0,0,-1.26818,0,0,0,2.6825, ldraw_lib__4_4con1()],
];
module ldraw_lib__54821(step=0, col=false, unit=2/5, alt=false, line=0.2, solid=!$preview)
    makepoly(ldraw_lib__54821(), step=step, col=col, unit=unit, alt=alt, line=line, solid=solid);
ldraw_lib__54821(line=0.2);
